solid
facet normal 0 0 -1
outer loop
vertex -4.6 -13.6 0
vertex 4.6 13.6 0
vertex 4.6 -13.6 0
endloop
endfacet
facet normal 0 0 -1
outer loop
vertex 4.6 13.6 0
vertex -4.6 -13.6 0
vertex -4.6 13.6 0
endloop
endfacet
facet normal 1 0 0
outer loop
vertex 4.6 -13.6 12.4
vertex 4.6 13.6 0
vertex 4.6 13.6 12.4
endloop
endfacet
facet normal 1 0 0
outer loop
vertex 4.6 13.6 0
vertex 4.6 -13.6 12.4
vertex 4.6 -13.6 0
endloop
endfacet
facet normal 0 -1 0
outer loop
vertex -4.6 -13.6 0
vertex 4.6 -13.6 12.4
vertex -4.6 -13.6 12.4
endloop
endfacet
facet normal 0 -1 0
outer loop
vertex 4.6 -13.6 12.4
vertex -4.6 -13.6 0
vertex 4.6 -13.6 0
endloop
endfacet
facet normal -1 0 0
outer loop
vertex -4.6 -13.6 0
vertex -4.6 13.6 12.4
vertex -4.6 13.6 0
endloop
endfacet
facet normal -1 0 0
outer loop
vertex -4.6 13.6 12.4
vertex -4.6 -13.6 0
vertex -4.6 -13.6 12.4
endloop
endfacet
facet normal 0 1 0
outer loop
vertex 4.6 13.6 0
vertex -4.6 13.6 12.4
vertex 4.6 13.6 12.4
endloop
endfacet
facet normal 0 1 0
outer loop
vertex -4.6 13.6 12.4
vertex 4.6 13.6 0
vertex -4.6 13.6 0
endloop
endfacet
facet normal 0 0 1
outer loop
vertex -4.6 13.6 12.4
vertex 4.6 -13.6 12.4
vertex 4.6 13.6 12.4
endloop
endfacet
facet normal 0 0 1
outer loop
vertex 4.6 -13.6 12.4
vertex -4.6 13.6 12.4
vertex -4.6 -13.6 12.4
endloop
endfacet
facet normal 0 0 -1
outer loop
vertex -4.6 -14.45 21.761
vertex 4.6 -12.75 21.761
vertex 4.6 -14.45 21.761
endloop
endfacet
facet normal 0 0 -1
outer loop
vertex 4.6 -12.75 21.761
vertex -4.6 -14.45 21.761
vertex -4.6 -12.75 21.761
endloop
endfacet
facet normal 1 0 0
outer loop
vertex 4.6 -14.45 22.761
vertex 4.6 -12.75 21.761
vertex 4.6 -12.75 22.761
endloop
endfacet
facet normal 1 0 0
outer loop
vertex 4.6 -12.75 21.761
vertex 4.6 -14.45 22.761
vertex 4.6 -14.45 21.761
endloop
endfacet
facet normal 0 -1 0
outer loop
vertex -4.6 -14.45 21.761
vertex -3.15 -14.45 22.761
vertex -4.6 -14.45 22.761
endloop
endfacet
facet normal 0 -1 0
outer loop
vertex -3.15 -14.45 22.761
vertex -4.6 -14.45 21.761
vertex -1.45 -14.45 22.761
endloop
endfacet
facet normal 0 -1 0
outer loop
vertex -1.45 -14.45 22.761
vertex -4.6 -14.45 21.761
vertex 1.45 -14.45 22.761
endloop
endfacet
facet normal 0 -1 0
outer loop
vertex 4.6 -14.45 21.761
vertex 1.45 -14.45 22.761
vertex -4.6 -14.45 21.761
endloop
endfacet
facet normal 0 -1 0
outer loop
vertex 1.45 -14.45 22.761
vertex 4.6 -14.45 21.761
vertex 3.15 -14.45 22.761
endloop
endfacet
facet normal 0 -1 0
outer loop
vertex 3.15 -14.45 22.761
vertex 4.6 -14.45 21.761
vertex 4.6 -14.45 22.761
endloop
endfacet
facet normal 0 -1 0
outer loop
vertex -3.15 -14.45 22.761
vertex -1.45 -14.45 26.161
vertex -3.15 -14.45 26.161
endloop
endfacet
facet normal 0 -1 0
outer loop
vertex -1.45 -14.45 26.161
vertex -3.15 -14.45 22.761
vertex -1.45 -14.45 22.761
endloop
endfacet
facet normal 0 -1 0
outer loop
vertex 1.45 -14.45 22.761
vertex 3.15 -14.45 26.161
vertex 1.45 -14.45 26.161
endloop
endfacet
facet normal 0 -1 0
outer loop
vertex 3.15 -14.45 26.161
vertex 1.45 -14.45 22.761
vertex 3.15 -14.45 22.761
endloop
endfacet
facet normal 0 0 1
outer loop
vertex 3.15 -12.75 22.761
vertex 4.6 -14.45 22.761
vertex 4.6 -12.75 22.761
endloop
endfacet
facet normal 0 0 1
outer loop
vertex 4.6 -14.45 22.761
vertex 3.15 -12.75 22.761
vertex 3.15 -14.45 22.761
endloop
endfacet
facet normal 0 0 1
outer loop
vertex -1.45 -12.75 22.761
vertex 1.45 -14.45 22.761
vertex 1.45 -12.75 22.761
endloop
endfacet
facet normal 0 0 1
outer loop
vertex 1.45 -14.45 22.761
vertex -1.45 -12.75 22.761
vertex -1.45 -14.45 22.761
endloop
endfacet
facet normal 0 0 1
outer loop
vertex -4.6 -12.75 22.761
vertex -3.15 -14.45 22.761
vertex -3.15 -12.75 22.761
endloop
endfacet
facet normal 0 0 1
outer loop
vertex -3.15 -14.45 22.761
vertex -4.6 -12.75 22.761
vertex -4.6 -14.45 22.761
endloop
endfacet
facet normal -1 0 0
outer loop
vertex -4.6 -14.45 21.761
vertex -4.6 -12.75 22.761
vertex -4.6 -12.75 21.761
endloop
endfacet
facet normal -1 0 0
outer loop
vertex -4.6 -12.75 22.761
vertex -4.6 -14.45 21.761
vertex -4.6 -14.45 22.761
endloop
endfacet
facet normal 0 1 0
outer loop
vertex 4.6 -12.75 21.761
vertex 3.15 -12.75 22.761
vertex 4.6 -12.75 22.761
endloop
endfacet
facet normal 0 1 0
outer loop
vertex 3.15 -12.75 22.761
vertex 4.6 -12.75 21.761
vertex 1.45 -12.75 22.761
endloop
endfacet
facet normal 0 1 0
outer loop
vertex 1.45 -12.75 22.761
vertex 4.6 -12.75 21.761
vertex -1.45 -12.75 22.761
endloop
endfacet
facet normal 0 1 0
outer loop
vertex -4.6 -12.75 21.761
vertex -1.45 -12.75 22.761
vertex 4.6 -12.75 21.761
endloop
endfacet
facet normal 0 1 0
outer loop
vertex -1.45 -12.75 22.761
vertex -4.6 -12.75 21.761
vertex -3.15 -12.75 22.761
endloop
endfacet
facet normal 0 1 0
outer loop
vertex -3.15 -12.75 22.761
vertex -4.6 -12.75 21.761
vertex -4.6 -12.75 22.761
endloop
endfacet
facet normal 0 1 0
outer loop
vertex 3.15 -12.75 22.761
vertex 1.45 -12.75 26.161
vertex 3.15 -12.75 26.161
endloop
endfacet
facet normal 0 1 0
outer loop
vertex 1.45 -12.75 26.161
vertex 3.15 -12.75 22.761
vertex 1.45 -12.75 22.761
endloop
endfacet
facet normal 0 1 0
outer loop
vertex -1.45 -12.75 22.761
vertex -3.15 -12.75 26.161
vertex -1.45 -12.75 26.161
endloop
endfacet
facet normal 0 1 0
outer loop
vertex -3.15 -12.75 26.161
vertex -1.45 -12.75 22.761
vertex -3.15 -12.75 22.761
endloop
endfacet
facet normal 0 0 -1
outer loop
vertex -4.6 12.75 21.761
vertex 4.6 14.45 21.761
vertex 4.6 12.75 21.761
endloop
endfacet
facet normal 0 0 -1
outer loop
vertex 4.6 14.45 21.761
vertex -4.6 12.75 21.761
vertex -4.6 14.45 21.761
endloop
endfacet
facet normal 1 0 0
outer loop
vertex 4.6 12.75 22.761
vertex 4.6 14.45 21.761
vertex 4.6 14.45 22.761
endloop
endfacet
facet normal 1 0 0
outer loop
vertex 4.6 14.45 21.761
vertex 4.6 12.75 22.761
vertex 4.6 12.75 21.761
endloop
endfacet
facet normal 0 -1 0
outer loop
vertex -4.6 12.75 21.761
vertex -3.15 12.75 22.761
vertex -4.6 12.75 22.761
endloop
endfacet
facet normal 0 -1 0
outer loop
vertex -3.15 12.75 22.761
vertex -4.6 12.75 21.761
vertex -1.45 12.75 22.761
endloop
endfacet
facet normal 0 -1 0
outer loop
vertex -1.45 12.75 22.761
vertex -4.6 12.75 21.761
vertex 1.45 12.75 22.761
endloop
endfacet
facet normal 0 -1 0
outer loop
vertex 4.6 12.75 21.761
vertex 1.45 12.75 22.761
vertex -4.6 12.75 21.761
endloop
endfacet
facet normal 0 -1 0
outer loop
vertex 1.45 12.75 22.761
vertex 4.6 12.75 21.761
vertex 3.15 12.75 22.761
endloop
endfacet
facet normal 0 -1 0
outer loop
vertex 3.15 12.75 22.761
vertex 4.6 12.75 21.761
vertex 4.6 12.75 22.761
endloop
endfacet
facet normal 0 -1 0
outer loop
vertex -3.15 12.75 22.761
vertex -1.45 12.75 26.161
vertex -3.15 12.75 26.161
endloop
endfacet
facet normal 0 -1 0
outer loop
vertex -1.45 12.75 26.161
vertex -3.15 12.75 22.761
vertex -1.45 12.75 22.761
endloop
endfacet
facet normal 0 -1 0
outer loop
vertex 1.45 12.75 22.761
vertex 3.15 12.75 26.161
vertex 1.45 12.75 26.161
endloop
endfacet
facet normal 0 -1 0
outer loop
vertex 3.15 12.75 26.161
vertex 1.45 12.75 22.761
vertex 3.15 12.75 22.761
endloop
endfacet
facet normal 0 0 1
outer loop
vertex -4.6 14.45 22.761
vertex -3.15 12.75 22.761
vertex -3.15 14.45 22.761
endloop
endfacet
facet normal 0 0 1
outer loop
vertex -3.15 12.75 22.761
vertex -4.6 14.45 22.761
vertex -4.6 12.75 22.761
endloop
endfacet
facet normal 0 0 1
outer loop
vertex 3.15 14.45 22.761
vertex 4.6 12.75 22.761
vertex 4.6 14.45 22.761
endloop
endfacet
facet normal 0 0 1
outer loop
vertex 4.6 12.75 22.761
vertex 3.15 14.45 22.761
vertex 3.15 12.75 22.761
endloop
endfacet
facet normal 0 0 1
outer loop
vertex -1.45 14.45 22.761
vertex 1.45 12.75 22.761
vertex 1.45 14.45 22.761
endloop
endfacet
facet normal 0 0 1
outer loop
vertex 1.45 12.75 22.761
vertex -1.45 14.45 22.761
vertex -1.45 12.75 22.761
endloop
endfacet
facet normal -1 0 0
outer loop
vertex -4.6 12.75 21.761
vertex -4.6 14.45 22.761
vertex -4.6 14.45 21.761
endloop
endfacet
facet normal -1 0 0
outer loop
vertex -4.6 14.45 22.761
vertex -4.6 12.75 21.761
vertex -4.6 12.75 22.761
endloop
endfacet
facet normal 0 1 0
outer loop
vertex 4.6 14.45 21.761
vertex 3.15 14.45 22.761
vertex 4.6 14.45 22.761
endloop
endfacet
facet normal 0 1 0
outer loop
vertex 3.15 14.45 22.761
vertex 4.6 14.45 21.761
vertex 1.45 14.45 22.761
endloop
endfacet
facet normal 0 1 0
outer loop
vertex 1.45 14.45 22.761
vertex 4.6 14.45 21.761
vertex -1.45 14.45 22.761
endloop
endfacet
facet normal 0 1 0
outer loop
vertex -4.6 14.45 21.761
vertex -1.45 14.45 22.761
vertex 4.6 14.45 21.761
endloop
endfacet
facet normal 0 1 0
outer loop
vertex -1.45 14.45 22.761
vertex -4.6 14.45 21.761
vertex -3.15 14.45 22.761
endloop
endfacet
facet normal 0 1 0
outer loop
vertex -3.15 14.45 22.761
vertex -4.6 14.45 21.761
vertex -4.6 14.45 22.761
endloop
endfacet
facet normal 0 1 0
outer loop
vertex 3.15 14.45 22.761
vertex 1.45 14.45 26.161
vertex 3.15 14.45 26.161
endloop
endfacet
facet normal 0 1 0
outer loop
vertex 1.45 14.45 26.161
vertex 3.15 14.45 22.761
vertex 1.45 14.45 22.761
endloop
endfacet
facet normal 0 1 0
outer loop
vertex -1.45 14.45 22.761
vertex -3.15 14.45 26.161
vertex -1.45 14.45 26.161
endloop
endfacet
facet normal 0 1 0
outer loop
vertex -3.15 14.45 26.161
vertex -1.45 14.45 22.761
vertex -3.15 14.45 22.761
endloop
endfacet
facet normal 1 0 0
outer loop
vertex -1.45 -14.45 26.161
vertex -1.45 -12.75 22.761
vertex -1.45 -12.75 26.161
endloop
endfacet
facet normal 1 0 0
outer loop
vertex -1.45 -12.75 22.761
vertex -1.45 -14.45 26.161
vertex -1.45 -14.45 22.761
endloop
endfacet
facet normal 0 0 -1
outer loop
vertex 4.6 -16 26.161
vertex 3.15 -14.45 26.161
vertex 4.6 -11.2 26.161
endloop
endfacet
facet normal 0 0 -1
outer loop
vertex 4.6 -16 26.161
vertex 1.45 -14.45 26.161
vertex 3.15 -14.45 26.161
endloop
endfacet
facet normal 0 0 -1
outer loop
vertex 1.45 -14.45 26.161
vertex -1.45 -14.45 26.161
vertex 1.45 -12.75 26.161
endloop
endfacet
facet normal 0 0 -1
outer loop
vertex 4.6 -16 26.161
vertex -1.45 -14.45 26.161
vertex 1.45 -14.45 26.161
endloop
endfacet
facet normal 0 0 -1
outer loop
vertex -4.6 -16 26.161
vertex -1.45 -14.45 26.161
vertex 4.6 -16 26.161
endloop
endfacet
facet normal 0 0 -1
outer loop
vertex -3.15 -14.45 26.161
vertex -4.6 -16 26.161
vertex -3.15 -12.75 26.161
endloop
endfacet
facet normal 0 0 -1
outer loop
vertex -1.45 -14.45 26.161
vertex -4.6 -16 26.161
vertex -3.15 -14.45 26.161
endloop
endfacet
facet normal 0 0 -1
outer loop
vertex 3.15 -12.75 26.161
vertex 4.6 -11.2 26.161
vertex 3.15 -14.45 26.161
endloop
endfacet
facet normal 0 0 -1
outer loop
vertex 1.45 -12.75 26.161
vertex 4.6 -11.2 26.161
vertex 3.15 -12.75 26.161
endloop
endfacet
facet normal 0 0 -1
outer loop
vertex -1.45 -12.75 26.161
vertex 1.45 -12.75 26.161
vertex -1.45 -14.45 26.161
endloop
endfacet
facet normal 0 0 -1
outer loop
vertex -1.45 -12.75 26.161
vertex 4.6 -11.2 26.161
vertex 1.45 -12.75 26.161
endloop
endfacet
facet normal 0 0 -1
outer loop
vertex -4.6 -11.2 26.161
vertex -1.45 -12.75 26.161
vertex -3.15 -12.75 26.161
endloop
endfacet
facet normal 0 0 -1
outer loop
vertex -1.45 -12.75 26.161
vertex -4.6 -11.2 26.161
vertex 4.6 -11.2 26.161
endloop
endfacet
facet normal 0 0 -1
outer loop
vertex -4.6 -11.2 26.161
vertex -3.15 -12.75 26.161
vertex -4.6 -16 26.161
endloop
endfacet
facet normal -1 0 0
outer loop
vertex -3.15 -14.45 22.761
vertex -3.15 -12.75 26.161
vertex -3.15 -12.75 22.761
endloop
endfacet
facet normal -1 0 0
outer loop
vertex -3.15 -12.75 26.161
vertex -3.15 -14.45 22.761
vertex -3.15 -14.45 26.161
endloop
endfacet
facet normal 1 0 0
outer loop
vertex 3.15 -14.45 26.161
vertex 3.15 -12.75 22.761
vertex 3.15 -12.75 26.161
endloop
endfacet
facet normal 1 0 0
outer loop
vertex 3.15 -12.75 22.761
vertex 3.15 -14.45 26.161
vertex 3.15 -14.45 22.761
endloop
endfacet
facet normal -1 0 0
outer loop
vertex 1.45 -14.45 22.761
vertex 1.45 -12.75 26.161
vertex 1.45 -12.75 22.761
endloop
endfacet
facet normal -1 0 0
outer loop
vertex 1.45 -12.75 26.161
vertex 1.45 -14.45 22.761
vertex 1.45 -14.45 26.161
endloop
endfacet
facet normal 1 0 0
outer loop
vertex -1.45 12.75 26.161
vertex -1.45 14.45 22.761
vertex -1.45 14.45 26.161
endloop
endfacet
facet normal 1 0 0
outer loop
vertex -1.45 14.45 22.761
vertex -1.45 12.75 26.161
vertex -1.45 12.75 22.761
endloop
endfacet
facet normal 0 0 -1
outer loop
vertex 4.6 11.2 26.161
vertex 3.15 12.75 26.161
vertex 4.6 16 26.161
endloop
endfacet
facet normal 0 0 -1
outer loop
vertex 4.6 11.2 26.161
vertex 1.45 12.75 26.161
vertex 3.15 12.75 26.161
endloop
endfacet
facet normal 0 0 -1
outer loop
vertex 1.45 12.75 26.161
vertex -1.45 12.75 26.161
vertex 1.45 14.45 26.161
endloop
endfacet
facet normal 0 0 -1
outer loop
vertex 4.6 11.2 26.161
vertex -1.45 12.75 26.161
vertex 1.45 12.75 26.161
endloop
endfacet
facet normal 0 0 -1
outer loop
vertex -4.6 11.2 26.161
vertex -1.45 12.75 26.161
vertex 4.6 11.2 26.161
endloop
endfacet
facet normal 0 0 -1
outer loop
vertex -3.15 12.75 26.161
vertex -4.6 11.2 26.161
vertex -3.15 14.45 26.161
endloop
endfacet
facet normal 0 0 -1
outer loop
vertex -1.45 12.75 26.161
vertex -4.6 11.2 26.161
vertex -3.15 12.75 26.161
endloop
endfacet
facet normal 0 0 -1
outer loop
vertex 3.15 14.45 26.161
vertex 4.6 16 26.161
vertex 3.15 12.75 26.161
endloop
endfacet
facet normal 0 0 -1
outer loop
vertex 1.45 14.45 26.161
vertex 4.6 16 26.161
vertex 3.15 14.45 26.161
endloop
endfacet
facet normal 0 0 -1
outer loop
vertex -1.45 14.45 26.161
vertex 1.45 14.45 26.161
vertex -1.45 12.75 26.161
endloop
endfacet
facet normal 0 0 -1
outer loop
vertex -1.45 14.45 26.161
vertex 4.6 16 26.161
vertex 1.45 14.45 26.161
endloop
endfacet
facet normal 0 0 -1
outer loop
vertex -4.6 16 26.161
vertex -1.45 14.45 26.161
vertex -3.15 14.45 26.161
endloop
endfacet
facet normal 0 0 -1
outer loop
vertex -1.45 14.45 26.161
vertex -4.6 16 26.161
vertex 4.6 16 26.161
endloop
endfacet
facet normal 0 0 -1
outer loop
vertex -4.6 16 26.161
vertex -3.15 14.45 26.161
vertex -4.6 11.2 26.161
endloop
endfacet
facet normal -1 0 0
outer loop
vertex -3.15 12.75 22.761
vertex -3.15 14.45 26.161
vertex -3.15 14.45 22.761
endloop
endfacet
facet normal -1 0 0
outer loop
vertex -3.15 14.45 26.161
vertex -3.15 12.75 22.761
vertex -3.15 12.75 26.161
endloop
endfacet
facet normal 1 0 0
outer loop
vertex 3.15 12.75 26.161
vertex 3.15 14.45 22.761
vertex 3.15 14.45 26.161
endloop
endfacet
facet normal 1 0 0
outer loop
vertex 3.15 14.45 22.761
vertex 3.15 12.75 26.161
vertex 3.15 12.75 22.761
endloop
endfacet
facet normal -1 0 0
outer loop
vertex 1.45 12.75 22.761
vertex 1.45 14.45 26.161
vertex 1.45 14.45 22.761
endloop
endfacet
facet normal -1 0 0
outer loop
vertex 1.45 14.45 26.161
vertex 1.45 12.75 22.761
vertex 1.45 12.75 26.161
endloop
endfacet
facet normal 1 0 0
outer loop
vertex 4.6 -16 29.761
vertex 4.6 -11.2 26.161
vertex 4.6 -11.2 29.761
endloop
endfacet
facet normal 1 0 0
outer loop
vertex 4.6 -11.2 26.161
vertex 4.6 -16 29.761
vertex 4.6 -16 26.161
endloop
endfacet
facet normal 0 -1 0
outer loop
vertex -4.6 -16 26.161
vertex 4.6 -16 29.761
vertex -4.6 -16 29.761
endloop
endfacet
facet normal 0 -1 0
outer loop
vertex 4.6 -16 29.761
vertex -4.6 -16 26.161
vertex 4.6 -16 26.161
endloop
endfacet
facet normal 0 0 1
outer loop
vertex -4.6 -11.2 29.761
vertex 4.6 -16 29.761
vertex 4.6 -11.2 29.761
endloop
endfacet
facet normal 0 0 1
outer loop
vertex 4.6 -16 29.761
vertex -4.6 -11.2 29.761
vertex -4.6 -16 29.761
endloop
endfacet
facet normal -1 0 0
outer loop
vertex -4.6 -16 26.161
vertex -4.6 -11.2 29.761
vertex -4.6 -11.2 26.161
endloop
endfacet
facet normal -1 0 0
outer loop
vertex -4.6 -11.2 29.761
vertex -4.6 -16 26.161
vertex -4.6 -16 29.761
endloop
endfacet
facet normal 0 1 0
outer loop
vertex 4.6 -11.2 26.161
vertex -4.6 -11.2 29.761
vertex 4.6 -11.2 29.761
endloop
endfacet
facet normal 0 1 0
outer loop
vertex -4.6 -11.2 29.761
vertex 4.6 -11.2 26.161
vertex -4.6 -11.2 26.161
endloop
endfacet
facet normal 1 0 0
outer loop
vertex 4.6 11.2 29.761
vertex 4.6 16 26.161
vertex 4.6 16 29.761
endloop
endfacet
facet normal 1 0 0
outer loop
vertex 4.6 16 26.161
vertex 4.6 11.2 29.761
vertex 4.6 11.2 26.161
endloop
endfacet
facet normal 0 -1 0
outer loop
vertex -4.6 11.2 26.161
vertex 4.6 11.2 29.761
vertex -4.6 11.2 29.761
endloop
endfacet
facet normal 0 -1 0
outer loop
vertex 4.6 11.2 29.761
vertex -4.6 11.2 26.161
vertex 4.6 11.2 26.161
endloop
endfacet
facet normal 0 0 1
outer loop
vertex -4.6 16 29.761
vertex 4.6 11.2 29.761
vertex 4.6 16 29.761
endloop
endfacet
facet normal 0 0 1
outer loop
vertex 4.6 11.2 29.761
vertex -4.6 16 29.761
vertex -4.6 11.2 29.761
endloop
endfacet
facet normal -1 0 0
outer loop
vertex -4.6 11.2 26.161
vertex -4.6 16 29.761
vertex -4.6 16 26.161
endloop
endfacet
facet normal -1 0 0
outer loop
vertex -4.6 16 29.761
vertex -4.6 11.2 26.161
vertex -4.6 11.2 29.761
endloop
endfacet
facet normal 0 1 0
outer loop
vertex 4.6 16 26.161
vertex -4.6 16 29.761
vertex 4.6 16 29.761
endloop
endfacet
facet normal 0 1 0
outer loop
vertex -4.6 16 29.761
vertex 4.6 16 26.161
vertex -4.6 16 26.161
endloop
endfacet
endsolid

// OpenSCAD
// Generated by SolidPython 0.4.2 on 2020-09-29 23:20:55
//!OpenSCAD

scale(v = 0.0100000000) {
	translate(v = [-460, -1360, 0]) {
		union() {
			color(c = [0.4000000000, 0.4000000000, 0.4000000000]) {
				translate(v = [0, 0, 0]) {
					linear_extrude(height = 1000.0000000000) {
						polygon(paths = [[0, 1, 2, 3]], points = [[0, 0], [0, 2720], [920, 2720], [920, 0]]);
					}
				}
			}
			color(c = [0.2000000000, 0.6000000000, 0.2000000000]) {
				translate(v = [0, 0, 1000.0000000000]) {
					linear_extrude(height = 120.0000000000) {
						polygon(paths = [[0, 1, 2, 3]], points = [[0, 1305], [0, 2720], [920, 2720], [920, 1305]]);
					}
				}
			}
			color(c = [0.4000000000, 0.4000000000, 0.4000000000]) {
				translate(v = [0, 0, 1000.0000000000]) {
					linear_extrude(height = 120.0000000000) {
						polygon(paths = [[0, 1, 2, 3]], points = [[0, 0], [0, 1305], [920, 1305], [920, 0]]);
					}
				}
			}
			color(c = [0.2000000000, 0.6000000000, 0.2000000000]) {
				translate(v = [0, 0, 1120.0000000000]) {
					linear_extrude(height = 120.0000000000) {
						polygon(paths = [[0, 1, 2, 3]], points = [[0, 1305], [0, 2720], [920, 2720], [920, 1305]]);
					}
				}
			}
			color(c = [0.4000000000, 0.4000000000, 0.4000000000]) {
				translate(v = [0, 0, 1120.0000000000]) {
					linear_extrude(height = 120.0000000000) {
						polygon(paths = [[0, 1, 2, 3]], points = [[0, 0], [0, 1305], [920, 1305], [920, 0]]);
					}
				}
			}
			color(c = [0.9000000000, 0.6000000000, 0.6000000000]) {
				translate(v = [0, 0, 2176.1000000000]) {
					linear_extrude(height = 100.0000000000) {
						polygon(paths = [[0, 1, 2, 3]], points = [[0, -85], [0, 85], [920, 85], [920, -85]]);
					}
				}
			}
			color(c = [0.9000000000, 0.6000000000, 0.6000000000]) {
				translate(v = [0, 0, 2176.1000000000]) {
					linear_extrude(height = 100.0000000000) {
						polygon(paths = [[0, 1, 2, 3]], points = [[0, 2635], [0, 2805], [920, 2805], [920, 2635]]);
					}
				}
			}
			color(c = [0.5000000000, 0.5000000000, 0.5000000000]) {
				translate(v = [0, 0, 2276.1000000000]) {
					linear_extrude(height = 340.0000000000) {
						polygon(paths = [[0, 1, 2, 3]], points = [[145, -85], [145, 85], [315, 85], [315, -85]]);
					}
				}
			}
			color(c = [0.5000000000, 0.5000000000, 0.5000000000]) {
				translate(v = [0, 0, 2276.1000000000]) {
					linear_extrude(height = 340.0000000000) {
						polygon(paths = [[0, 1, 2, 3]], points = [[605, -85], [605, 85], [775, 85], [775, -85]]);
					}
				}
			}
			color(c = [0.5000000000, 0.5000000000, 0.5000000000]) {
				translate(v = [0, 0, 2276.1000000000]) {
					linear_extrude(height = 340.0000000000) {
						polygon(paths = [[0, 1, 2, 3]], points = [[145, 2635], [145, 2805], [315, 2805], [315, 2635]]);
					}
				}
			}
			color(c = [0.5000000000, 0.5000000000, 0.5000000000]) {
				translate(v = [0, 0, 2276.1000000000]) {
					linear_extrude(height = 340.0000000000) {
						polygon(paths = [[0, 1, 2, 3]], points = [[605, 2635], [605, 2805], [775, 2805], [775, 2635]]);
					}
				}
			}
			color(c = [0.3000000000, 0.3000000000, 1]) {
				translate(v = [0, 0, 2616.1000000000]) {
					linear_extrude(height = 360.0000000000) {
						polygon(paths = [[0, 1, 2, 3]], points = [[0, -240], [0, 240], [920, 240], [920, -240]]);
					}
				}
			}
			color(c = [0.3000000000, 0.3000000000, 1]) {
				translate(v = [0, 0, 2616.1000000000]) {
					linear_extrude(height = 360.0000000000) {
						polygon(paths = [[0, 1, 2, 3]], points = [[0, 2480], [0, 2960], [920, 2960], [920, 2480]]);
					}
				}
			}
		}
	}
}
